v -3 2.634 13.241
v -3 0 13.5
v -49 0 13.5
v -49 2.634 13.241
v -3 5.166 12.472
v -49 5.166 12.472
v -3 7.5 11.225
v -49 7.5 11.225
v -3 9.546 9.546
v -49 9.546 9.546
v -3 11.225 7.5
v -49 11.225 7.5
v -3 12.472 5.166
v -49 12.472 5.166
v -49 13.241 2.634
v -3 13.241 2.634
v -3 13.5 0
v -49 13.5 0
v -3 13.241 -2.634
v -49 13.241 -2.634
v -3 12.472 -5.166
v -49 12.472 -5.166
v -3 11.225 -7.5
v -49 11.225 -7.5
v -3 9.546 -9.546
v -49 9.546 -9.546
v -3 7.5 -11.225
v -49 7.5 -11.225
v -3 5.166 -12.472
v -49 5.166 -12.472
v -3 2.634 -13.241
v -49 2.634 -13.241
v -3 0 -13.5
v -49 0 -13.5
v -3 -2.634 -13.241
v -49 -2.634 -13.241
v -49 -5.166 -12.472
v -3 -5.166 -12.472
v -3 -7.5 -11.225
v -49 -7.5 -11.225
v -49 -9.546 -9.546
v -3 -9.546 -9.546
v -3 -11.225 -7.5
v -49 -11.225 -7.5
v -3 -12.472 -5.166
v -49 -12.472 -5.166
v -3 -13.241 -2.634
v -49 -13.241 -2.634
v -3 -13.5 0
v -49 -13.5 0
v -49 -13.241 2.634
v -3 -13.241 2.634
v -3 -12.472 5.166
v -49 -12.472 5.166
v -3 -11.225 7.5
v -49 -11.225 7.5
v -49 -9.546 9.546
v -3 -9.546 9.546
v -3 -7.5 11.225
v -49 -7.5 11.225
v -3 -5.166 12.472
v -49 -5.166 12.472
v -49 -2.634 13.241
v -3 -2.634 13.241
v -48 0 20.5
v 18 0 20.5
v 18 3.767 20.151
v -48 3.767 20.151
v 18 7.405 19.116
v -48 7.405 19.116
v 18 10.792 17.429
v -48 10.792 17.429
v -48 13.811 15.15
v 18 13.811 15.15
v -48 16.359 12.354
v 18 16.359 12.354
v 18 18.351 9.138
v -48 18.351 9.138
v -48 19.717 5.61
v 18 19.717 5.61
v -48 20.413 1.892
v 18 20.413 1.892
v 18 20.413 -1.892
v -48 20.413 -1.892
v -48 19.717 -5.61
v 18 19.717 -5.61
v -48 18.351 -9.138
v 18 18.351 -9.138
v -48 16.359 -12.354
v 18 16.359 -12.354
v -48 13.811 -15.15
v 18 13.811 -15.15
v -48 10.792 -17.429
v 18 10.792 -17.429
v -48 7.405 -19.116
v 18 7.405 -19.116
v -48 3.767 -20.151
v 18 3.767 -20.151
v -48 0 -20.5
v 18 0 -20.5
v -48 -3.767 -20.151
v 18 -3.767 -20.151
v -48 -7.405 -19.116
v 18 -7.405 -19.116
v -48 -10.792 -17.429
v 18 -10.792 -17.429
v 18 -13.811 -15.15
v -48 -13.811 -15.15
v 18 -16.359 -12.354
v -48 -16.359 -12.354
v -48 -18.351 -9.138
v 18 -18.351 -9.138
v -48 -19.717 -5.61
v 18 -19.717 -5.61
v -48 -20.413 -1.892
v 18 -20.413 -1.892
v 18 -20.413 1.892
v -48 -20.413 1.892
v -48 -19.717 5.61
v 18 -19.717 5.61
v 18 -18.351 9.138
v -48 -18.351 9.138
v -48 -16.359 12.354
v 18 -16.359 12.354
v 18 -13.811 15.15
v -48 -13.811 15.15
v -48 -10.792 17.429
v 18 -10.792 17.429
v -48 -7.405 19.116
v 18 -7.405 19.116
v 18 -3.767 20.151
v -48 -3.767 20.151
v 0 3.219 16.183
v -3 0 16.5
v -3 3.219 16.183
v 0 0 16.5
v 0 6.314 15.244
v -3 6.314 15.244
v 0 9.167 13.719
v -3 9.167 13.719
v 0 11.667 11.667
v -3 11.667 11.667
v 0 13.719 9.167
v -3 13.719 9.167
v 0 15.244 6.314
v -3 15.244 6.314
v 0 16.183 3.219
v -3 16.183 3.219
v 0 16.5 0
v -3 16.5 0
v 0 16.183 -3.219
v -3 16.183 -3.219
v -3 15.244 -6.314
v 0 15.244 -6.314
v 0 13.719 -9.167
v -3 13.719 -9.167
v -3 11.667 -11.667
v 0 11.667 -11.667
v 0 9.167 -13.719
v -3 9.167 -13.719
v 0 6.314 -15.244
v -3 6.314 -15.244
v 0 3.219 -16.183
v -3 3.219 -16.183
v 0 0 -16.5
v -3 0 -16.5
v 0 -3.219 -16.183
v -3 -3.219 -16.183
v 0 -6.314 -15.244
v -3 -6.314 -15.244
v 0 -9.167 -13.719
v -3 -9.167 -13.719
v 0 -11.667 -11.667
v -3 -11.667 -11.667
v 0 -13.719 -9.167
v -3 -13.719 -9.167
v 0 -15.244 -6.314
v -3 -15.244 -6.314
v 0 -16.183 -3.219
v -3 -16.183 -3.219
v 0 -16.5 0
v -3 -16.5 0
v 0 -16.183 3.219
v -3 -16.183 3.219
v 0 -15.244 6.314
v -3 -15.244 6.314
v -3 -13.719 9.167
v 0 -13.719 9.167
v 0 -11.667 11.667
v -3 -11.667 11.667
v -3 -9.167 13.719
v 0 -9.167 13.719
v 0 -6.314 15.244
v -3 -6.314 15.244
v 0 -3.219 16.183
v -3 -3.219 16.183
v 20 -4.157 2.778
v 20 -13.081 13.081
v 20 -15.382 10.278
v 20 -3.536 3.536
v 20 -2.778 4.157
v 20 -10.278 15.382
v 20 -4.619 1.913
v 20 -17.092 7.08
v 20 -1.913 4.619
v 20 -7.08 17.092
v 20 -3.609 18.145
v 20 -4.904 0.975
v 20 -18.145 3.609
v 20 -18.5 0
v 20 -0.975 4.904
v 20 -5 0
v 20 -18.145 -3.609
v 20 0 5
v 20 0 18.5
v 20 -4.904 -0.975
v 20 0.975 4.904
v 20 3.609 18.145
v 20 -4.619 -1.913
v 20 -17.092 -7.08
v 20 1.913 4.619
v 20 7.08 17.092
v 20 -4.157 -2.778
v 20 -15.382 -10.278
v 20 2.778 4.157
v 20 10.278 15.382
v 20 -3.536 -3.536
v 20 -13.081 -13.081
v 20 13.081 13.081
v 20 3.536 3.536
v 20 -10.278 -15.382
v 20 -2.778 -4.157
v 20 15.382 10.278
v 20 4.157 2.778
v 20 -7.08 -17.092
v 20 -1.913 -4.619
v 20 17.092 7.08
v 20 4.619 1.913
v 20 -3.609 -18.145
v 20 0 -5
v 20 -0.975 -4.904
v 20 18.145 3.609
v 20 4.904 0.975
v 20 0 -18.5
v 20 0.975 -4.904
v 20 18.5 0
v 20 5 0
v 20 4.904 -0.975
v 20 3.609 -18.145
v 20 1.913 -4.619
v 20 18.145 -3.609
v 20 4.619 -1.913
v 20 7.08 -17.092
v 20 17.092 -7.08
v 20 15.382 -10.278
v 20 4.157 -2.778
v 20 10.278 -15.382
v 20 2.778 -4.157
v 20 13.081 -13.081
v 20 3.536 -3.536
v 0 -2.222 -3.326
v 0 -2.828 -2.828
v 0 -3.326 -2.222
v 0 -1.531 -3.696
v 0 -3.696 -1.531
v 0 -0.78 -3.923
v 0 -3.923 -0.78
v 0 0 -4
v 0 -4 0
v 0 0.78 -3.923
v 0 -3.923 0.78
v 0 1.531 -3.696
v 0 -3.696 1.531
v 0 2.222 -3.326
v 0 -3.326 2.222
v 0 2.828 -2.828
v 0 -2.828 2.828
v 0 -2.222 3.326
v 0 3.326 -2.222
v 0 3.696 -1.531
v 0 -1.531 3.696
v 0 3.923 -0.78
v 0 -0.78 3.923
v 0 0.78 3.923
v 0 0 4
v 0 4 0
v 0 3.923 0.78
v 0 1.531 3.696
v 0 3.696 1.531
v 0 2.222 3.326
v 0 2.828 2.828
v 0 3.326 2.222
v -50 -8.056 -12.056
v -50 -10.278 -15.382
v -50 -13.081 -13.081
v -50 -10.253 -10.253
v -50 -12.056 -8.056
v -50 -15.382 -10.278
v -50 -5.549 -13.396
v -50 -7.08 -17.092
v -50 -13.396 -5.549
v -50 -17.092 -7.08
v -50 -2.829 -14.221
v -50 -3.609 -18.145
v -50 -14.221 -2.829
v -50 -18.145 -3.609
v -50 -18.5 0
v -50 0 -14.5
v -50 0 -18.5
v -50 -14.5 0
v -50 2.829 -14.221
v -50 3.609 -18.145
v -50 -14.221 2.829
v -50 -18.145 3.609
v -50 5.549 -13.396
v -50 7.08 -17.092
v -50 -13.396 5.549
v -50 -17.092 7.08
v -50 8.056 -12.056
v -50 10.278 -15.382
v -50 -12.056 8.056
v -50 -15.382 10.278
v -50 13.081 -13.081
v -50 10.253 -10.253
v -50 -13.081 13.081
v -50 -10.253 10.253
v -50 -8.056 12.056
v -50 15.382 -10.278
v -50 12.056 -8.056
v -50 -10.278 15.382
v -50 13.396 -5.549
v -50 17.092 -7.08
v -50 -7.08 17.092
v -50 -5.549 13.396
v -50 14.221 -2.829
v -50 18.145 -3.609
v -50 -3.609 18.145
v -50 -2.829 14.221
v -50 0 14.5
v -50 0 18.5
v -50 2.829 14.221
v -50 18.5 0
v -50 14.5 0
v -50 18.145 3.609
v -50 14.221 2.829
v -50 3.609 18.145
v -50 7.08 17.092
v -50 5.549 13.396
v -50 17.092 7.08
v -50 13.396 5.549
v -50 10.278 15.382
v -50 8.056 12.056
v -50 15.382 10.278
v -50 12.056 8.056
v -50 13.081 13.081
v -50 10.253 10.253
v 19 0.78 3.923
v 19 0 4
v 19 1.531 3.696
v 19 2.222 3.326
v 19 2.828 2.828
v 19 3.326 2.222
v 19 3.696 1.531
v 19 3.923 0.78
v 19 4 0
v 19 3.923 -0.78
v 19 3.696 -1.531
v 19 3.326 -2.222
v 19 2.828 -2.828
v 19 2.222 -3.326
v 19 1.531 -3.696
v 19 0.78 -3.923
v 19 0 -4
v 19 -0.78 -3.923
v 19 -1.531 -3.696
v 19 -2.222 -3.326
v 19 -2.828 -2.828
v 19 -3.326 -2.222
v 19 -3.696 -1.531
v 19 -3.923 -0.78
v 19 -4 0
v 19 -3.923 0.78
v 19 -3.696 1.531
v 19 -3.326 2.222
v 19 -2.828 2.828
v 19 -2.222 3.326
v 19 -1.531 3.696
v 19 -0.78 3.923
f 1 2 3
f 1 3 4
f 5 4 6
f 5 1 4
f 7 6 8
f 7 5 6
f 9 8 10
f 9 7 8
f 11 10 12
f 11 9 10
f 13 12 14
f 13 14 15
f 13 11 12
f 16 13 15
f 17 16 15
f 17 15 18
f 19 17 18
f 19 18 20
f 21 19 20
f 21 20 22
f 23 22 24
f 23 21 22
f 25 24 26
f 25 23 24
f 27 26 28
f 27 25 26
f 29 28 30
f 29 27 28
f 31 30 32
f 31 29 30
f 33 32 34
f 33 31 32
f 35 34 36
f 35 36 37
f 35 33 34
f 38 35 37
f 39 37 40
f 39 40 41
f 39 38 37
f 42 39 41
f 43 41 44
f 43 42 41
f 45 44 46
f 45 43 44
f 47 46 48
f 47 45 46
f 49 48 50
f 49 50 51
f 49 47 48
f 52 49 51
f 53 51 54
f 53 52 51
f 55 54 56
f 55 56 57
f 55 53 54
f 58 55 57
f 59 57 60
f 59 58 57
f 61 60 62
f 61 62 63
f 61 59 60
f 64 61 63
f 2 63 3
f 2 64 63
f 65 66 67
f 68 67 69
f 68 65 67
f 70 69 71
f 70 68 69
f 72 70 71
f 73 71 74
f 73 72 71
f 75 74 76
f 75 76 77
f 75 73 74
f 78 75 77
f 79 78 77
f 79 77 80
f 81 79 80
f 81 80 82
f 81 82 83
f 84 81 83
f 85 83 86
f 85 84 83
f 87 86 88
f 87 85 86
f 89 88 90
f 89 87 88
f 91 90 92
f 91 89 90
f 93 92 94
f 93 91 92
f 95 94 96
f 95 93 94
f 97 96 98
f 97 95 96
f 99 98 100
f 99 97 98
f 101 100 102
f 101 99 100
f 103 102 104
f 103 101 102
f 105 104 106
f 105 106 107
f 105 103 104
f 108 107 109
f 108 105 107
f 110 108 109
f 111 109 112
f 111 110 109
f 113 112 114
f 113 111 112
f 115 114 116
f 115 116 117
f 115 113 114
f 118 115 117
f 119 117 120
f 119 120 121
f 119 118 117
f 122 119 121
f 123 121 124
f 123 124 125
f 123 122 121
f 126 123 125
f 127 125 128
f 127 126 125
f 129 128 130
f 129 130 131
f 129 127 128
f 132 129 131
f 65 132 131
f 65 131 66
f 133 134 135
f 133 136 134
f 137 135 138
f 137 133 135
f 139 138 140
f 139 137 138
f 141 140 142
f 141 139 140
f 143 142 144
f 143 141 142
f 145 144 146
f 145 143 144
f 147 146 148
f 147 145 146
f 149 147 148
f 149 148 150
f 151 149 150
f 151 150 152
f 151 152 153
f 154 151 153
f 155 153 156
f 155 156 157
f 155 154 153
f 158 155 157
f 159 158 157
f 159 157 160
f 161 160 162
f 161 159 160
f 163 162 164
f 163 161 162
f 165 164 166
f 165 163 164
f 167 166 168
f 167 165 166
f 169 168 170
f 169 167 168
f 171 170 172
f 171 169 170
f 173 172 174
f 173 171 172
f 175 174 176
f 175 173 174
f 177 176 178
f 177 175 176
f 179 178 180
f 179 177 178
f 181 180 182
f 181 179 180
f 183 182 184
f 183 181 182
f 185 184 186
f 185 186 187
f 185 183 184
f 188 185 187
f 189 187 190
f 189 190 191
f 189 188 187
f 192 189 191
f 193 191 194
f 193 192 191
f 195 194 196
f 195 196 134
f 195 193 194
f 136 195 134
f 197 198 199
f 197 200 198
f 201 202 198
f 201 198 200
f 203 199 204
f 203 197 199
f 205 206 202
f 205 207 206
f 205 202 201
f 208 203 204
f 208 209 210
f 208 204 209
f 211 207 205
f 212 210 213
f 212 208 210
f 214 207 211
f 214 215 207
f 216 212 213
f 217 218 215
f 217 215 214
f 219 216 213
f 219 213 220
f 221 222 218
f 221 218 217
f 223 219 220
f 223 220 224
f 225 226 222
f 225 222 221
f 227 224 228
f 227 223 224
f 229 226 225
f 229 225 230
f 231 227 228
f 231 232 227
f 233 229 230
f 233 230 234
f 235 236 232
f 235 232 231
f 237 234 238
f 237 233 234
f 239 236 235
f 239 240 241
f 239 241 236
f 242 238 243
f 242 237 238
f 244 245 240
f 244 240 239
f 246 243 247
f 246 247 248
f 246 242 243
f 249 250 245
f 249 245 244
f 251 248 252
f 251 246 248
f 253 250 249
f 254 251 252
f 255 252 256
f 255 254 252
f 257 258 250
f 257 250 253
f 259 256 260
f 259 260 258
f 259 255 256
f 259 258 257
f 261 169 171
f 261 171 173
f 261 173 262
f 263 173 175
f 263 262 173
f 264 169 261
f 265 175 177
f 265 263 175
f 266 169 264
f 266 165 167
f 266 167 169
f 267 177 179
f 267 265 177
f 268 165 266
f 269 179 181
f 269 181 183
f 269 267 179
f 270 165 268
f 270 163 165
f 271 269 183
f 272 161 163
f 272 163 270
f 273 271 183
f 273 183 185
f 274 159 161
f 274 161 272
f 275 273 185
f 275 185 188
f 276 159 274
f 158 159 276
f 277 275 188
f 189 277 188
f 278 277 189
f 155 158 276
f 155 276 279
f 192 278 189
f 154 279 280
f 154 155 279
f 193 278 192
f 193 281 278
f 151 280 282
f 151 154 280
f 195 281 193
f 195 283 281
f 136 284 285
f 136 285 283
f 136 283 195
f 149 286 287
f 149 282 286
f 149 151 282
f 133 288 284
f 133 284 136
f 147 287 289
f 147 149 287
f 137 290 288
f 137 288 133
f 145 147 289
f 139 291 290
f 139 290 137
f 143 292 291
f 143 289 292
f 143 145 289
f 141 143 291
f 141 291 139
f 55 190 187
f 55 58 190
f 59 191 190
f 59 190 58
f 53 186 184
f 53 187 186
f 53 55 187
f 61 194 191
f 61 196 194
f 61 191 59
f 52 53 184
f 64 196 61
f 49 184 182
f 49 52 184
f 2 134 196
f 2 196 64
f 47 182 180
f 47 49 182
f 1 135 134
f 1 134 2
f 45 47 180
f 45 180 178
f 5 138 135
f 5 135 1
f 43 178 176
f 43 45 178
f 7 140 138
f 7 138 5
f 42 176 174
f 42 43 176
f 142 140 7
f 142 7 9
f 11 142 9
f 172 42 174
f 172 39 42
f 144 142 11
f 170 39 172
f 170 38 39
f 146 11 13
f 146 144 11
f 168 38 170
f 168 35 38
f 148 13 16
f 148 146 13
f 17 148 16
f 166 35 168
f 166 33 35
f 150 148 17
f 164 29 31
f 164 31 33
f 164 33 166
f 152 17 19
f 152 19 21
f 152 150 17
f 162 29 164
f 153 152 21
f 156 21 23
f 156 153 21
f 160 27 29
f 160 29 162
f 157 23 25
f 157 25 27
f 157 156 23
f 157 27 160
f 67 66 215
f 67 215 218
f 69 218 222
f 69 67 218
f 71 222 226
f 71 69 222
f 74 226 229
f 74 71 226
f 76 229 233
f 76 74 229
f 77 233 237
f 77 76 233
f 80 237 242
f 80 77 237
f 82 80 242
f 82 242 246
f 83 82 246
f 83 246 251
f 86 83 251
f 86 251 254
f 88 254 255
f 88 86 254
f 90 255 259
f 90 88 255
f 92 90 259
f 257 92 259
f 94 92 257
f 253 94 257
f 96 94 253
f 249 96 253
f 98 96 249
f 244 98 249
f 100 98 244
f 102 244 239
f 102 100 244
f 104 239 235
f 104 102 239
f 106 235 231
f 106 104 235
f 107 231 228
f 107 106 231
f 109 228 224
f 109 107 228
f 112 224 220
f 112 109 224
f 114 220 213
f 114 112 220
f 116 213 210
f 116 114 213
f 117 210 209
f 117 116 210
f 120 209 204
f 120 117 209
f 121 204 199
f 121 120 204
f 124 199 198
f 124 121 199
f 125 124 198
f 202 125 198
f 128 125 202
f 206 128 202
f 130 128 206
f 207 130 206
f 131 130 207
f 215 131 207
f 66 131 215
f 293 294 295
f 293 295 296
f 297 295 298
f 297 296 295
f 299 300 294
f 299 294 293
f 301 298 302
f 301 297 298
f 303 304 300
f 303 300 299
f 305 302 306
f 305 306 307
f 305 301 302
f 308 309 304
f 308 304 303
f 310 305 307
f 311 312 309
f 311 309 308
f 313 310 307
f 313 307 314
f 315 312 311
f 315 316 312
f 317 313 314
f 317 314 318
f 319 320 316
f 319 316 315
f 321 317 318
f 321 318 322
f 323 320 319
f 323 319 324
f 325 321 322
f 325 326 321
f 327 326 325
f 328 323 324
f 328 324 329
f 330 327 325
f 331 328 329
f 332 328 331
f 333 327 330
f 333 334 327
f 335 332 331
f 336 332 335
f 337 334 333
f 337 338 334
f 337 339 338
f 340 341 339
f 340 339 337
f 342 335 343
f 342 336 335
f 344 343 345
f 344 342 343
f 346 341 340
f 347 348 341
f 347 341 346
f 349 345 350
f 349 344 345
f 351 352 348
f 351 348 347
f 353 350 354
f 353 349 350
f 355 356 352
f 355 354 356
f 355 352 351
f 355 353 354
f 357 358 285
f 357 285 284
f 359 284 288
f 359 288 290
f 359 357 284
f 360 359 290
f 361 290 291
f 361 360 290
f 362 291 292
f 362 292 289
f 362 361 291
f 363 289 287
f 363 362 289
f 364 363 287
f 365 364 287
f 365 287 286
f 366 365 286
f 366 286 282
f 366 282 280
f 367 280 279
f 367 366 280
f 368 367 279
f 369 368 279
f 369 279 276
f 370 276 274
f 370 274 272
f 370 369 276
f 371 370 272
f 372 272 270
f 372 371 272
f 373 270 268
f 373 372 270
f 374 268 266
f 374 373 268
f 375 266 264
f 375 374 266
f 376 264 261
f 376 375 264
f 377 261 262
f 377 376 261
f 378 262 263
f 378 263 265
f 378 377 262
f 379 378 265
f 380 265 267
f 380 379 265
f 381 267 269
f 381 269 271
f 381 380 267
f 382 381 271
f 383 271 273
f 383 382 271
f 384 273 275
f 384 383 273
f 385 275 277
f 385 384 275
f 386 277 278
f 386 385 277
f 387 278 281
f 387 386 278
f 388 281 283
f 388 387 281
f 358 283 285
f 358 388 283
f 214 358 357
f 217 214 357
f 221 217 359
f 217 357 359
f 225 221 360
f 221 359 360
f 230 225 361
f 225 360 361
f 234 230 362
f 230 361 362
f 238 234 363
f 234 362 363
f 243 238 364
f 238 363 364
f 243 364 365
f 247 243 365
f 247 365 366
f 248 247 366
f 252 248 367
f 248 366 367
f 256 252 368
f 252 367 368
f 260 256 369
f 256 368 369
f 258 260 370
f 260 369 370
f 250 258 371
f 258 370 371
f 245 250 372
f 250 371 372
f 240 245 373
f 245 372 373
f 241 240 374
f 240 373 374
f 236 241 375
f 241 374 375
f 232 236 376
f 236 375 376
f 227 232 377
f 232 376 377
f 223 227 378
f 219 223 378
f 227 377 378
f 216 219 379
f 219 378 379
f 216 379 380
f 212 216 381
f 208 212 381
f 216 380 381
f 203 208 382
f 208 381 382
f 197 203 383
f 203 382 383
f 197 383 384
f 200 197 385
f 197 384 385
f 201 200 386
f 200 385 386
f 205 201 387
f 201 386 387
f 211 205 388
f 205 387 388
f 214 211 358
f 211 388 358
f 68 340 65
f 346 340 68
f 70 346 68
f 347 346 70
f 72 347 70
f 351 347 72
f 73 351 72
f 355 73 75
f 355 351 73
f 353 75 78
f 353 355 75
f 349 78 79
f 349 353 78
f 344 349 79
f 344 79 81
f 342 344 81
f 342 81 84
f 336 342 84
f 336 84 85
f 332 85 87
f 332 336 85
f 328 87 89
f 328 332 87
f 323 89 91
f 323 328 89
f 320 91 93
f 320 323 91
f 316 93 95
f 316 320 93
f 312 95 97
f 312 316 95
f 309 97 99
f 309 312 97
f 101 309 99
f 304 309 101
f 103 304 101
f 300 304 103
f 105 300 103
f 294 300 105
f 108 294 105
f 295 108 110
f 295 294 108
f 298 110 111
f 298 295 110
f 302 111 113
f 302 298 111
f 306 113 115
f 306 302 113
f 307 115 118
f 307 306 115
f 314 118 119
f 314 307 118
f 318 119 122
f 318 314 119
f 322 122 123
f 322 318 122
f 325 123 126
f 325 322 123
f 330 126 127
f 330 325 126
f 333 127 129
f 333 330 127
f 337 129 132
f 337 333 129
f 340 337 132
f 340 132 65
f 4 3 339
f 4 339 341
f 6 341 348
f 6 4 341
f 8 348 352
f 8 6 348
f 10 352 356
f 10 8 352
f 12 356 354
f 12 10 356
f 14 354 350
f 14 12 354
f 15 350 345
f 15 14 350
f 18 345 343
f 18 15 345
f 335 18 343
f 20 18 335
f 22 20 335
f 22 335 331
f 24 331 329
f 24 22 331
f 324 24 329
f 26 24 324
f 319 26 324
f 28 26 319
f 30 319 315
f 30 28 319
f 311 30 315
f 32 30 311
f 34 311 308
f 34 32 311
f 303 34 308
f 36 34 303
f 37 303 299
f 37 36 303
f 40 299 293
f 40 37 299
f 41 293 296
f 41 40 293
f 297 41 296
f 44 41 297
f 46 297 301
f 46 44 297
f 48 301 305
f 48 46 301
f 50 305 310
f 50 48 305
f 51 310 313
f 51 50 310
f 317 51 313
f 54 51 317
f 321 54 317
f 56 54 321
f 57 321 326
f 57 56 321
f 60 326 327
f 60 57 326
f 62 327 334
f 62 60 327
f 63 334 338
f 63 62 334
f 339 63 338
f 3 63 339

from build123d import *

# Parameters (mm, degrees)
F2_SIZE = 2
F3_SIZE = 1


with BuildPart() as f1:
    # F0 (on Front) → F1 (revolve)
    with BuildSketch(Plane.XZ):
        Polygon((0, 13.5), (0, 4), (20, 4), (20, 20.5), (-50, 20.5), (-50, 13.5), (-3, 13.5), (-3, 16.5), (0, 16.5), align=None)
    revolve(axis=Axis((-15.148313, 0, 0), (-1, 0, 0)))

    # F2
    f2_edges = [f1.edges().sort_by_distance(p)[0] for p in [
        (-50, 0, -20.5),
        (20, 0, -20.5),
    ]]
    chamfer(f2_edges, length=F2_SIZE)

    # F3
    f3_edges = [f1.edges().sort_by_distance(p)[0] for p in [
        (-50, 0, -13.5),
        (20, 0, -4),
    ]]
    chamfer(f3_edges, length=F3_SIZE)


solid = f1.part
